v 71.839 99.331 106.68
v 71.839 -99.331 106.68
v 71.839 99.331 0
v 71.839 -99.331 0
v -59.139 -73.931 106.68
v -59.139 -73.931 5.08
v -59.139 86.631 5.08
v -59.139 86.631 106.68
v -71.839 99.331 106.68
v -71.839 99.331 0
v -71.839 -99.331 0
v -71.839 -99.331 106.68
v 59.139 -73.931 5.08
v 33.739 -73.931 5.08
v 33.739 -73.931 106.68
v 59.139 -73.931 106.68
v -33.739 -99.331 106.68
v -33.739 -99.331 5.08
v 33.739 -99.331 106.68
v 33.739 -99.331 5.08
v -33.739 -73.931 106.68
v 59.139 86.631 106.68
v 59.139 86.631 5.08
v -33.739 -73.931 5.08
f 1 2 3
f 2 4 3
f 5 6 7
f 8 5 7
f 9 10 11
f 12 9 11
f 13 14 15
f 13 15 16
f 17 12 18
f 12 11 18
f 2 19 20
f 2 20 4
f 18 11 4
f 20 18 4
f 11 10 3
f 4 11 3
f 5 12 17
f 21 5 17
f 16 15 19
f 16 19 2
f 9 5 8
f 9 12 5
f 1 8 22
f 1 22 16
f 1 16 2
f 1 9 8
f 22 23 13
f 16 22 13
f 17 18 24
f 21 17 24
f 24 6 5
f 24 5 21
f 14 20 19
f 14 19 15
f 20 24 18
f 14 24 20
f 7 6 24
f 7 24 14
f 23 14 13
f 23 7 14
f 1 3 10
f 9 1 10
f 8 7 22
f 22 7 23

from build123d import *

# Parameters (mm, degrees)
F0_W     = 143.67862
F0_H     = 198.66103
F1_DEPTH = 5.08
F2_W     = 118.27862
F2_H     = 12.7
F2_W_2   = 25.4
F2_H_2   = 25.4
F3_DEPTH = 101.6


with BuildPart() as f1:
    # F0 (on Top) → F1 (new body)
    with BuildSketch(Plane.XY):
        Rectangle(F0_W, F0_H)
    extrude(amount=F1_DEPTH)

    # F2 (on face) → F3 (join)
    with BuildSketch(Plane.XY.offset(5.08)):
        Polygon((-59.13931, 99.330515), (-71.83931, 99.330515), (-71.83931, -99.330515), (-59.13931, -99.330515), (-59.13931, -73.930515), (-59.13931, 86.630515), align=None)
        with Locations((0, 92.980515)):
            Rectangle(F2_W, F2_H)
        Polygon((71.83931, 99.330515), (59.13931, 99.330515), (59.13931, 86.630515), (59.13931, -73.930515), (59.13931, -99.330515), (71.83931, -99.330515), align=None)
        with Locations((-46.43931, -86.630515)):
            Rectangle(F2_W_2, F2_H_2)
        with Locations((46.43931, -86.630515)):
            Rectangle(F2_W_2, F2_H_2)
    extrude(amount=F3_DEPTH)


solid = f1.part
